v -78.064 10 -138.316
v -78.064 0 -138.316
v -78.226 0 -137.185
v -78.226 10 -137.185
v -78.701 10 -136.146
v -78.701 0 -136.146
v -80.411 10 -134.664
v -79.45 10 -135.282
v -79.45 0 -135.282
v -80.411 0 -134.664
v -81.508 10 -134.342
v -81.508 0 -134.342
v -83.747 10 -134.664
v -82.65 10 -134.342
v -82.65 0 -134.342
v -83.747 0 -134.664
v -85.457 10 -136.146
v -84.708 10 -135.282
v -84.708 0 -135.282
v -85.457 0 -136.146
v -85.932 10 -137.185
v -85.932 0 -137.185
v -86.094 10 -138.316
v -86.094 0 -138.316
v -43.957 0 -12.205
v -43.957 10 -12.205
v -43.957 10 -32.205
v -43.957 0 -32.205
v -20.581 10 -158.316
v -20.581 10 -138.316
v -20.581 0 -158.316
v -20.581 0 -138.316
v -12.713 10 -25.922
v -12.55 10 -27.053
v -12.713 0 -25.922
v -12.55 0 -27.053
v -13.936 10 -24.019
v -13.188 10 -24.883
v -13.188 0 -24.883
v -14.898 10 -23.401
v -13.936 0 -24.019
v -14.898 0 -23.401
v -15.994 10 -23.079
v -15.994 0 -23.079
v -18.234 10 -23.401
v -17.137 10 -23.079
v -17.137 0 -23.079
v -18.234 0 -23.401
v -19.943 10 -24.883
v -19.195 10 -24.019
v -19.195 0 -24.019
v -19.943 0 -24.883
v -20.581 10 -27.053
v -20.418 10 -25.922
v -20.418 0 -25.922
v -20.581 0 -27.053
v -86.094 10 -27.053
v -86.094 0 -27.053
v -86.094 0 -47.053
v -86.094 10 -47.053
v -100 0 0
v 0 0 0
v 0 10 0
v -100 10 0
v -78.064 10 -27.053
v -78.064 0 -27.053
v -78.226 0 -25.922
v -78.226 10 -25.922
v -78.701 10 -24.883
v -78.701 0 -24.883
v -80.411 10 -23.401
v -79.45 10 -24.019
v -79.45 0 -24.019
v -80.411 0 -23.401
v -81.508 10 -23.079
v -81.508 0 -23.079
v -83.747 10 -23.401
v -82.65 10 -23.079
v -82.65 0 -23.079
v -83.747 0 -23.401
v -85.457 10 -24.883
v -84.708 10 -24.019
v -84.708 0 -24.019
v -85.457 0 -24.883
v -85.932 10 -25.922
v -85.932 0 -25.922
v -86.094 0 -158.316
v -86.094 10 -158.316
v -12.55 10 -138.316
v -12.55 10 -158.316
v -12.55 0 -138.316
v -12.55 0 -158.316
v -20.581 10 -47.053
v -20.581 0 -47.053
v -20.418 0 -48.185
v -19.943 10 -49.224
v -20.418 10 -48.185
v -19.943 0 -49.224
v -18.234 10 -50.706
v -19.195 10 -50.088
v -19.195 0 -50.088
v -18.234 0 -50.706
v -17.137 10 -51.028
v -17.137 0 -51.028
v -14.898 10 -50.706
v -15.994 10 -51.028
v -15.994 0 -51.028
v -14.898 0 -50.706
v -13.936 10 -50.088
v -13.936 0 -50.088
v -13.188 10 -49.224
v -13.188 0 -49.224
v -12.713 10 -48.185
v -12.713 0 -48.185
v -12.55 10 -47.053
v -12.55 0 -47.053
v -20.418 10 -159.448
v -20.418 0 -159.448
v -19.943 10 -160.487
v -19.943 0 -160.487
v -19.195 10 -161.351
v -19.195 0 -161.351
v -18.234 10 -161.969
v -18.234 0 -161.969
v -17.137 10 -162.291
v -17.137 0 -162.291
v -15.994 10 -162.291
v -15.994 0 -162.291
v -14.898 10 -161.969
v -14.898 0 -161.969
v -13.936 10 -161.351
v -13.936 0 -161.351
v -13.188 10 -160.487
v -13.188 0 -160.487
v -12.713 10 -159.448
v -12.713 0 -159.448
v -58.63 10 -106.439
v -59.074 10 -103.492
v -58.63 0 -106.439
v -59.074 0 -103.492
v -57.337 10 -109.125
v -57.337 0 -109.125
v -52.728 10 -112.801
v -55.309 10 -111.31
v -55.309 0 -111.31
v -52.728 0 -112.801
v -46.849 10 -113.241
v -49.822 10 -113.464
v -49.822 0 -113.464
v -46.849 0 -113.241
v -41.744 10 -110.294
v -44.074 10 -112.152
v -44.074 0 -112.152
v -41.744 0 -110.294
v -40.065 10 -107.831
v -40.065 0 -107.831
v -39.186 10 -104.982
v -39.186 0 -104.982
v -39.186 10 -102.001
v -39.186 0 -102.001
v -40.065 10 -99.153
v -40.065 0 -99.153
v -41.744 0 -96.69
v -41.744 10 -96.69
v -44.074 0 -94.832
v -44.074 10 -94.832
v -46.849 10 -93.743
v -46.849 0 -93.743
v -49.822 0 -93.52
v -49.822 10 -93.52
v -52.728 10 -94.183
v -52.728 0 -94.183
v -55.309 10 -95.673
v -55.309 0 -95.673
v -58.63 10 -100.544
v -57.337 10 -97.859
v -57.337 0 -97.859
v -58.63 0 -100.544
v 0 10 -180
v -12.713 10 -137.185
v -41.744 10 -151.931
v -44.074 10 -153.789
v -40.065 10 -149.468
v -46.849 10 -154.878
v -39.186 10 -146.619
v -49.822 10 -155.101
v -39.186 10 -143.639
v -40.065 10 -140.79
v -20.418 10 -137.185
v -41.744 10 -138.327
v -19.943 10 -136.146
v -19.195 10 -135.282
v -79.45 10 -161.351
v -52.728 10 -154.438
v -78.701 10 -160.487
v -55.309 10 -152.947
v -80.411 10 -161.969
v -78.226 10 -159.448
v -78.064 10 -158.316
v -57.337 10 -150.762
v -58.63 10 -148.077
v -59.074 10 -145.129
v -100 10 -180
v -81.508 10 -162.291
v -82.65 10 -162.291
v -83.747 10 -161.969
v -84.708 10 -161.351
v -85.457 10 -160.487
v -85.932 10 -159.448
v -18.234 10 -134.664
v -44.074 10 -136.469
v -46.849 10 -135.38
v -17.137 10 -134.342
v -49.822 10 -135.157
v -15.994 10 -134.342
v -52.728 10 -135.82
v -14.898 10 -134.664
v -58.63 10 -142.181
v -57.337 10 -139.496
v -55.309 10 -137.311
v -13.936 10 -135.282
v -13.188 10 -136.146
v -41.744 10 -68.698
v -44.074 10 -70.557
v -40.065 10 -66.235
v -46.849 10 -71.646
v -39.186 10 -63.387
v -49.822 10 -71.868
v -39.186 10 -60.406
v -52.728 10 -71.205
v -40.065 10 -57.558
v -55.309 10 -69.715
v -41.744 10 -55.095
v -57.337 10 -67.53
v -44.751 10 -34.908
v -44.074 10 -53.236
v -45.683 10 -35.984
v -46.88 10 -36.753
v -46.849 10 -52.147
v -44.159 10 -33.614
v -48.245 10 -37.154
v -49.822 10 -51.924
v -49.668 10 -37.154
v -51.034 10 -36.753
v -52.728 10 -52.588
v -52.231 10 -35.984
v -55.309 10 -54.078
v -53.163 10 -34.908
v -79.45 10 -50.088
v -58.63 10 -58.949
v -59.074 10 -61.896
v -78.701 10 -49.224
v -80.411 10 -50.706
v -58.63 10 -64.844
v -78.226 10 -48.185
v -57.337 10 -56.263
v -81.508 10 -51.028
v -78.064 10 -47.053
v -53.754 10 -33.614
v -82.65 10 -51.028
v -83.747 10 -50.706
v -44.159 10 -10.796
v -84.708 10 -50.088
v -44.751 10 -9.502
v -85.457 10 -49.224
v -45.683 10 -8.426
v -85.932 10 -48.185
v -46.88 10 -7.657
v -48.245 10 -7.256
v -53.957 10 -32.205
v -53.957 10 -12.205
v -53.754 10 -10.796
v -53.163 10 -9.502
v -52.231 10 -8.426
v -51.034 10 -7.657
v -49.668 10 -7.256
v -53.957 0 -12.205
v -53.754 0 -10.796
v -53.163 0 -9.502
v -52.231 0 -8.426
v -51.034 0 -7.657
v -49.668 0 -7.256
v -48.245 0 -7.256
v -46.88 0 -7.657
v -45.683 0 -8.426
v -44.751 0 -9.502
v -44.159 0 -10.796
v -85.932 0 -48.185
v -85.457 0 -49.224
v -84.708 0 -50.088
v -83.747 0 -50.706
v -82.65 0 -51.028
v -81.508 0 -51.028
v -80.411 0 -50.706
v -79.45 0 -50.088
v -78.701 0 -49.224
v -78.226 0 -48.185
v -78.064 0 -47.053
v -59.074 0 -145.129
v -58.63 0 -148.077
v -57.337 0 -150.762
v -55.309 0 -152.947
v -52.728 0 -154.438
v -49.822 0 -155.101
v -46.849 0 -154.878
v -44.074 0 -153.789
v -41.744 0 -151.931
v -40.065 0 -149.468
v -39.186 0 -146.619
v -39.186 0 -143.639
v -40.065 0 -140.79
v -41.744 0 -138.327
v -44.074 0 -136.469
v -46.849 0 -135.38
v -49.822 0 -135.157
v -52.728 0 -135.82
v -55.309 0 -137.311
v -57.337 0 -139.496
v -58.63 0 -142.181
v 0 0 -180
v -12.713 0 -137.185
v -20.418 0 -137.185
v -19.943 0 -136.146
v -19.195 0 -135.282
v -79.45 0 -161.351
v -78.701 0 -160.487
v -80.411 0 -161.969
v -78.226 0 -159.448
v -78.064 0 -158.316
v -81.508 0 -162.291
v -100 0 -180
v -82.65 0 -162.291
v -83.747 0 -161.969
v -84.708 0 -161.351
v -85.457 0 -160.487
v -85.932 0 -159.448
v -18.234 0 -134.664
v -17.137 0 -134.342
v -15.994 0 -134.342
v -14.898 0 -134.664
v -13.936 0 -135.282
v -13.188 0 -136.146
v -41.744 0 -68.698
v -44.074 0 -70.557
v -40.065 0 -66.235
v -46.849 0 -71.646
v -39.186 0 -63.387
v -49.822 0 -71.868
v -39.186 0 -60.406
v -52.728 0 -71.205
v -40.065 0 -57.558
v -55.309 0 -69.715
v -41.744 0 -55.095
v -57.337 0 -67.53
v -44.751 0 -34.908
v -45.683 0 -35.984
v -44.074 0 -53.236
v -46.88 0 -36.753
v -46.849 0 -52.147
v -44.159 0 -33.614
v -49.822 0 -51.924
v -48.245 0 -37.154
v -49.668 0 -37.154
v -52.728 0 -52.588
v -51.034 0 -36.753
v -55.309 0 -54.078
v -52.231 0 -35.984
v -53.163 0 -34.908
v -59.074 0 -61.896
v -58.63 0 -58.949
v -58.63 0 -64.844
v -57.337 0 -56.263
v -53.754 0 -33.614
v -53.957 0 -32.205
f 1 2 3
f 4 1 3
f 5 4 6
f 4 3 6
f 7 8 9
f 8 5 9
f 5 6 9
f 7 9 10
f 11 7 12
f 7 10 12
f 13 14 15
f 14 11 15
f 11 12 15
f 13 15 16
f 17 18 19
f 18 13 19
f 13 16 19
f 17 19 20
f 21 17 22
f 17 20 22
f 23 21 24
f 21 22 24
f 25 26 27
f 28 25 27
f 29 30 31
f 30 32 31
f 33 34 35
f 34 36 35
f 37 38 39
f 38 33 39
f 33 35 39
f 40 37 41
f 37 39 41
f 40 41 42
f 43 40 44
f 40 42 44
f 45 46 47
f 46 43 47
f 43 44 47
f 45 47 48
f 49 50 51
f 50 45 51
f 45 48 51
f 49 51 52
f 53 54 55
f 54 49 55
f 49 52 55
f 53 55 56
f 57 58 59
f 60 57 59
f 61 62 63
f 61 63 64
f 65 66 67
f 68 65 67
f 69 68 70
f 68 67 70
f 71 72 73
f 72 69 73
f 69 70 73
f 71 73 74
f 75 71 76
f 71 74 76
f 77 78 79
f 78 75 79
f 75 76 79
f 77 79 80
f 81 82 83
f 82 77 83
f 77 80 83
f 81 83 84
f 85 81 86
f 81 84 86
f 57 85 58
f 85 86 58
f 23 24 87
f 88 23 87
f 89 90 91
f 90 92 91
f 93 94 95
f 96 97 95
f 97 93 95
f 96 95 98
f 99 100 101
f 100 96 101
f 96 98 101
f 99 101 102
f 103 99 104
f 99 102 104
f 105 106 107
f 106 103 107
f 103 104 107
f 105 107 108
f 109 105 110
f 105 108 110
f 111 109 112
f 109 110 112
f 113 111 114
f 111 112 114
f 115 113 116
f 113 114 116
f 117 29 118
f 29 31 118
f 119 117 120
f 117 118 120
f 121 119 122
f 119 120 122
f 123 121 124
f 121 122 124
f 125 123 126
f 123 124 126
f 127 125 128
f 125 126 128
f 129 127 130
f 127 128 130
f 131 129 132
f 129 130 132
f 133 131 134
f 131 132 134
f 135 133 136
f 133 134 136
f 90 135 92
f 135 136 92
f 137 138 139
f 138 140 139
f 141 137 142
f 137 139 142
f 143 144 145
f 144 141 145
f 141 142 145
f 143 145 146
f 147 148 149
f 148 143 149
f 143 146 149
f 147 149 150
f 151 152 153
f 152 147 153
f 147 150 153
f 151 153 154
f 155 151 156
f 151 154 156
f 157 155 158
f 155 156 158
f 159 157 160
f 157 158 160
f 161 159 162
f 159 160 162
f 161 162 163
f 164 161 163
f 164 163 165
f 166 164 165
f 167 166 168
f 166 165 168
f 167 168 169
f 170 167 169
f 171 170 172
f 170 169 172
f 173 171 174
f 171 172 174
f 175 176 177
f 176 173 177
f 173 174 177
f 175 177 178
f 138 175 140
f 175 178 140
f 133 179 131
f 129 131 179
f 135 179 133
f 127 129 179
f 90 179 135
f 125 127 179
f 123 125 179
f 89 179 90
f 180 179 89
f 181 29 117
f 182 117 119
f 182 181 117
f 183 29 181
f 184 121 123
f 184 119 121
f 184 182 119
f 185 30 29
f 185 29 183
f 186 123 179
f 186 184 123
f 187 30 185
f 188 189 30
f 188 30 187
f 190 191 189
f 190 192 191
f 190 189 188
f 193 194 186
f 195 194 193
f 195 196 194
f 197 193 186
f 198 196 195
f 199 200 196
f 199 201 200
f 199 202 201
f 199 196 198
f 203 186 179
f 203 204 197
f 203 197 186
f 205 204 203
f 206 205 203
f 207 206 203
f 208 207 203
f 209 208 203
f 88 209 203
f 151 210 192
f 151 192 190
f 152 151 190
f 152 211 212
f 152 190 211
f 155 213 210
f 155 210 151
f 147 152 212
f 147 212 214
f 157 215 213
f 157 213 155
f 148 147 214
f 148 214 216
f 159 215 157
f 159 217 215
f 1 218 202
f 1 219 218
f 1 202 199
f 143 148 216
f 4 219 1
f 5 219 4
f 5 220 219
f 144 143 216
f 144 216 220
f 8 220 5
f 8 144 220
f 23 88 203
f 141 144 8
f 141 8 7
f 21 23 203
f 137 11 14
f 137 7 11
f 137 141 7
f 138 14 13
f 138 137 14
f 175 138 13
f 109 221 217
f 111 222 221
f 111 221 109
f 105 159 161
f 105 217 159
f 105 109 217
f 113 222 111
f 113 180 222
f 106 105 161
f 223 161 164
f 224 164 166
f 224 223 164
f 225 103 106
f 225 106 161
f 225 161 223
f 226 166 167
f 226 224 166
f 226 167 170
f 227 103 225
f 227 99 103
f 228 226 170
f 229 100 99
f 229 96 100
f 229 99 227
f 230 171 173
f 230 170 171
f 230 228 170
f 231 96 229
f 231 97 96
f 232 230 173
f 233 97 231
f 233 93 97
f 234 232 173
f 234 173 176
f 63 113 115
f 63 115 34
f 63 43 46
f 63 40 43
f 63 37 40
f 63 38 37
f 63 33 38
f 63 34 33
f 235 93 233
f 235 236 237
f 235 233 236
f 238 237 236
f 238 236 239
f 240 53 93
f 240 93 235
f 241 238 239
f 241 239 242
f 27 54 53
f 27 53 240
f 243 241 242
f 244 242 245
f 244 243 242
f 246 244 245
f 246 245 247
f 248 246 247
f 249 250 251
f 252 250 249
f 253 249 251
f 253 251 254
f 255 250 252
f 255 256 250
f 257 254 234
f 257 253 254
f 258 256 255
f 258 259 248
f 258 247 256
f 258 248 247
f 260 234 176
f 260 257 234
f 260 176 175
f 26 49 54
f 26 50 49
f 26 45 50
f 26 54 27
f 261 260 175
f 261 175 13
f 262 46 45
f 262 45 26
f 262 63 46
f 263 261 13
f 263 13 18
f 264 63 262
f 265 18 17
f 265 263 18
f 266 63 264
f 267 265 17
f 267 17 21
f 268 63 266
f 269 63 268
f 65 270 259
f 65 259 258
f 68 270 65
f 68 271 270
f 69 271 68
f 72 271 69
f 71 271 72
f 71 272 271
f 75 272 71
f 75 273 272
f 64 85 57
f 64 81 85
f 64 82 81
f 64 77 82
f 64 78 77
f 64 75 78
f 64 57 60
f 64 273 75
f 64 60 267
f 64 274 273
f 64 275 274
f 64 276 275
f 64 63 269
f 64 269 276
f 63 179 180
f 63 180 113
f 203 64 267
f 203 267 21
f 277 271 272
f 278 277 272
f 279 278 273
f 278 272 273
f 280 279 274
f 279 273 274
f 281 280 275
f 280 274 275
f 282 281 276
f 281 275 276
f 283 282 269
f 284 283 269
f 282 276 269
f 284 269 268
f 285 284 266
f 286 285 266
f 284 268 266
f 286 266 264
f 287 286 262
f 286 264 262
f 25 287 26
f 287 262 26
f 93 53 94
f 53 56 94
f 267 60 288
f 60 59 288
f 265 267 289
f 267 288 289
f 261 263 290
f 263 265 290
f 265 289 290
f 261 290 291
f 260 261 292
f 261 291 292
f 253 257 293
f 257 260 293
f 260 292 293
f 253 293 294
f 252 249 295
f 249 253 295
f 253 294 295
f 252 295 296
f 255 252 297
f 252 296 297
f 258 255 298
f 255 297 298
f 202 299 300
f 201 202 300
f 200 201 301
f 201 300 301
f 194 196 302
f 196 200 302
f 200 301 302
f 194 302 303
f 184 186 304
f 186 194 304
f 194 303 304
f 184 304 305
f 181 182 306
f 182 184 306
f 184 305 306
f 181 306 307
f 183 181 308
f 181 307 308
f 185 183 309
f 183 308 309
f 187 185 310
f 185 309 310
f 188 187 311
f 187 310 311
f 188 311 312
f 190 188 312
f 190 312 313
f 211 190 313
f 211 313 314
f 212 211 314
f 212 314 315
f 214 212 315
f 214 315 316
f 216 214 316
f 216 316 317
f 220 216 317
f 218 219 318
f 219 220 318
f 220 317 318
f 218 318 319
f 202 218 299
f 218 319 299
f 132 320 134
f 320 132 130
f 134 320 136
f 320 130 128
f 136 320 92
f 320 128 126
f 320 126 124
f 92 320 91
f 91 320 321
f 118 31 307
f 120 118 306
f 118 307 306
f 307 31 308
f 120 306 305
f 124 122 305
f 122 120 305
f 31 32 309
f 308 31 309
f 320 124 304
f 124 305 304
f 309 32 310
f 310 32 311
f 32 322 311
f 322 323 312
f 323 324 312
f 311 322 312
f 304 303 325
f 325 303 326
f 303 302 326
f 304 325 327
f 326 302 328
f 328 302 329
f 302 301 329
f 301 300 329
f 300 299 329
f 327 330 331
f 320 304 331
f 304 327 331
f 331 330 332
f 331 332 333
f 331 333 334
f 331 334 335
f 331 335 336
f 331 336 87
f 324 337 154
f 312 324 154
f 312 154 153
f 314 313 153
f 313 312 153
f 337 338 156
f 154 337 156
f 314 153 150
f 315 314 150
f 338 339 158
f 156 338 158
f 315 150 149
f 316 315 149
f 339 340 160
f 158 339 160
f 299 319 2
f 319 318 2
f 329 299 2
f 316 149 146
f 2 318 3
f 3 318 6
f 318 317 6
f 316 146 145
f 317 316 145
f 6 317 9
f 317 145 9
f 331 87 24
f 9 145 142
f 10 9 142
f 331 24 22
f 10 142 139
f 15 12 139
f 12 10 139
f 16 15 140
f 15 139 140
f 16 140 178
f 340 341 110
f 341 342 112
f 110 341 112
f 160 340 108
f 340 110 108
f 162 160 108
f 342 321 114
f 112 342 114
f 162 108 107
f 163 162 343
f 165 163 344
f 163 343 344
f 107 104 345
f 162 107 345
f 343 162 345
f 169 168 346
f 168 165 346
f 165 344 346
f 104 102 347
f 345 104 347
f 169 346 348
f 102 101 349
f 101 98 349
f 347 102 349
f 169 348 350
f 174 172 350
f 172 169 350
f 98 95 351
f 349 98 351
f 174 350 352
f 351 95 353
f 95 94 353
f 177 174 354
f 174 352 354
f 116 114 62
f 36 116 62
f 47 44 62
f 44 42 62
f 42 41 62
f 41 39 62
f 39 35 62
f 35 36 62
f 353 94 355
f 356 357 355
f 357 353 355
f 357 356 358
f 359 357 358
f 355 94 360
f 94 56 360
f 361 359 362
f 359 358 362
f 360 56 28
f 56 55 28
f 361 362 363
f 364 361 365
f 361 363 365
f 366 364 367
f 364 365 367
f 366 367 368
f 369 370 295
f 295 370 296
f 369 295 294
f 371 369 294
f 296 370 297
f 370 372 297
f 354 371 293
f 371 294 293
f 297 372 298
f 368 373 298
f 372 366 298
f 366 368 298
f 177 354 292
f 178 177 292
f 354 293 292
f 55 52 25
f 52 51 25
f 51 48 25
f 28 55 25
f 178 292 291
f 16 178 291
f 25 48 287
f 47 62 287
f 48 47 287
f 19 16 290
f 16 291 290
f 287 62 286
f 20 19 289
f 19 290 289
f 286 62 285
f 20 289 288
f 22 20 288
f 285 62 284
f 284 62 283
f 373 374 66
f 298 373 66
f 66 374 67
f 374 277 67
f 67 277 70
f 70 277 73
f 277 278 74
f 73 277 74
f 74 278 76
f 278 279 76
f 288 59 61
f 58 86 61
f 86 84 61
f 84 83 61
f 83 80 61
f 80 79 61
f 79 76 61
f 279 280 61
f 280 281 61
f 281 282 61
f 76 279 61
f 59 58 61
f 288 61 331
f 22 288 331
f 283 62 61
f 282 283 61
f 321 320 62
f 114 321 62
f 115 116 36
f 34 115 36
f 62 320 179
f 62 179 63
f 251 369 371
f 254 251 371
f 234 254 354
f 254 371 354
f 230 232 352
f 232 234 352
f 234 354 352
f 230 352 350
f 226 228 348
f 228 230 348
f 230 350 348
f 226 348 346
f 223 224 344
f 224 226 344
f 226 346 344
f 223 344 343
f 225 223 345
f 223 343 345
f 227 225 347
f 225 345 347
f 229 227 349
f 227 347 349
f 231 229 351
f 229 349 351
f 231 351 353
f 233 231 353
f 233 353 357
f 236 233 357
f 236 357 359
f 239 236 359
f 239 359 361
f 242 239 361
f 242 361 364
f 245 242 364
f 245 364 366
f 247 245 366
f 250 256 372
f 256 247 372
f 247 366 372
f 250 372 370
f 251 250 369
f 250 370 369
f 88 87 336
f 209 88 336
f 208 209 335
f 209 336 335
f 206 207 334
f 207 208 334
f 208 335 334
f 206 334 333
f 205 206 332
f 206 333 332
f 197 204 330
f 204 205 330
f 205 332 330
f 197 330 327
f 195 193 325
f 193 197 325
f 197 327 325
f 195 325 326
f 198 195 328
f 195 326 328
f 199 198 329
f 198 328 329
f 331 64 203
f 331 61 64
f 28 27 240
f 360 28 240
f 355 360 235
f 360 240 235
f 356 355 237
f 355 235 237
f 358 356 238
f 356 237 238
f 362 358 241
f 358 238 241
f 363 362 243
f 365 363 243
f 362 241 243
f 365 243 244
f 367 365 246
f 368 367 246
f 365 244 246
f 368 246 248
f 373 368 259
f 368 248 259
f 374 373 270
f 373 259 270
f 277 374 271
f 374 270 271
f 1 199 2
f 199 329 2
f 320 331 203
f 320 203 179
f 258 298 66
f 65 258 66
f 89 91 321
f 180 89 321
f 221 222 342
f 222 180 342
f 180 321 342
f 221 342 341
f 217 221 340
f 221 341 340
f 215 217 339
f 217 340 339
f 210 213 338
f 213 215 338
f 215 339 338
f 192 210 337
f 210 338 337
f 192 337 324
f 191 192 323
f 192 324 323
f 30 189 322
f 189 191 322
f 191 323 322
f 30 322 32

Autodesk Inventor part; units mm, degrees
ref_plane "YZ Plane" through (0, 0, 0) normal (1, 0, 0) x (0, 1, 0)
ref_plane "XZ Plane" through (0, 0, 0) normal (0, 1, 0) x (-1, 0, 0)
ref_plane "XY Plane" through (0, 0, 0) normal (0, 0, 1) x (1, 0, 0)
sketch "Sketch1" plane through (0, 0, 0) normal (0, 1, 0) x (-1, 0, 0)
  line L0 (0, 0) -> (100, 0)
  line L1 (100, 0) -> (100, -180)
  line L2 (100, -180) -> (0, -180)
  line L3 (0, -180) -> (0, 0)
  dimension "d0" = 100
  dimension "d1" = 180
sketch "Sketch2" plane through (0, 0, 0) normal (0, 1, 0) x (-1, 0, 0)
  circle A0 centre (49.0743, -61.8964) radius 10
  circle A1 centre (49.0743, -103.4918) radius 10
  circle A2 centre (49.0743, -145.129) radius 10
  line L0 (82.079, -27.0534) -> (82.079, -47.0534) construction
  line L1 (86.0942, -27.0534) -> (86.0942, -47.0534)
  line L2 (78.0638, -47.0534) -> (78.0638, -27.0534)
  arc A3 (86.0942, -27.0534) -> (78.0638, -27.0534) centre (82.079, -27.0534) ccw
  arc A4 (78.0638, -47.0534) -> (86.0942, -47.0534) centre (82.079, -47.0534) ccw
  line L3 (16.5655, -27.0534) -> (16.5655, -47.0534) construction
  line L4 (20.5808, -27.0534) -> (20.5808, -47.0534)
  line L5 (12.5503, -47.0534) -> (12.5503, -27.0534)
  arc A5 (20.5808, -27.0534) -> (12.5503, -27.0534) centre (16.5655, -27.0534) ccw
  arc A6 (12.5503, -47.0534) -> (20.5808, -47.0534) centre (16.5655, -47.0534) ccw
  line L6 (82.079, -138.3165) -> (82.079, -158.3165) construction
  line L7 (86.0942, -138.3165) -> (86.0942, -158.3165)
  line L8 (78.0638, -158.3165) -> (78.0638, -138.3165)
  arc A7 (86.0942, -138.3165) -> (78.0638, -138.3165) centre (82.079, -138.3165) ccw
  arc A8 (78.0638, -158.3165) -> (86.0942, -158.3165) centre (82.079, -158.3165) ccw
  line L9 (16.5655, -138.3165) -> (16.5655, -158.3165) construction
  line L10 (20.5808, -138.3165) -> (20.5808, -158.3165)
  line L11 (12.5503, -158.3165) -> (12.5503, -138.3165)
  arc A9 (20.5808, -138.3165) -> (12.5503, -138.3165) centre (16.5655, -138.3165) ccw
  arc A10 (12.5503, -158.3165) -> (20.5808, -158.3165) centre (16.5655, -158.3165) ccw
  point P0 (0, 0)
  point P1 (82.079, -37.0534)
  point P2 (16.5655, -37.0534)
  point P3 (82.079, -148.3165)
  point P4 (16.5655, -148.3165)
  dimension "d3" = 20
  dimension "d13" = 20
  dimension "d14" = 20
  dimension "d15" = 20
  dimension "d16" = 20
extrude "Extrusion1" add sketch "Sketch1" along normal blind 10
extrude "Extrusion2" cut sketch "Sketch2" along normal blind 10
sketch "Sketch6" plane through (0, 10, 0) normal (0, 1, 0) x (1, 0, 0)
  line L0 (-48.9569, 12.2049) -> (-48.9569, 32.2049) construction
  line L1 (-43.9569, 12.2049) -> (-43.9569, 32.2049)
  line L2 (-53.9569, 32.2049) -> (-53.9569, 12.2049)
  arc A0 (-53.9569, 12.2049) -> (-43.9569, 12.2049) centre (-48.9569, 12.2049) ccw
  arc A1 (-43.9569, 32.2049) -> (-53.9569, 32.2049) centre (-48.9569, 32.2049) ccw
  point P0 (0, 0)
  point P1 (-48.9569, 22.2049)
  dimension "d9" = 20
extrude "Extrusion3" cut sketch "Sketch6" against normal blind 10
properties part number "Sliding Plate"
